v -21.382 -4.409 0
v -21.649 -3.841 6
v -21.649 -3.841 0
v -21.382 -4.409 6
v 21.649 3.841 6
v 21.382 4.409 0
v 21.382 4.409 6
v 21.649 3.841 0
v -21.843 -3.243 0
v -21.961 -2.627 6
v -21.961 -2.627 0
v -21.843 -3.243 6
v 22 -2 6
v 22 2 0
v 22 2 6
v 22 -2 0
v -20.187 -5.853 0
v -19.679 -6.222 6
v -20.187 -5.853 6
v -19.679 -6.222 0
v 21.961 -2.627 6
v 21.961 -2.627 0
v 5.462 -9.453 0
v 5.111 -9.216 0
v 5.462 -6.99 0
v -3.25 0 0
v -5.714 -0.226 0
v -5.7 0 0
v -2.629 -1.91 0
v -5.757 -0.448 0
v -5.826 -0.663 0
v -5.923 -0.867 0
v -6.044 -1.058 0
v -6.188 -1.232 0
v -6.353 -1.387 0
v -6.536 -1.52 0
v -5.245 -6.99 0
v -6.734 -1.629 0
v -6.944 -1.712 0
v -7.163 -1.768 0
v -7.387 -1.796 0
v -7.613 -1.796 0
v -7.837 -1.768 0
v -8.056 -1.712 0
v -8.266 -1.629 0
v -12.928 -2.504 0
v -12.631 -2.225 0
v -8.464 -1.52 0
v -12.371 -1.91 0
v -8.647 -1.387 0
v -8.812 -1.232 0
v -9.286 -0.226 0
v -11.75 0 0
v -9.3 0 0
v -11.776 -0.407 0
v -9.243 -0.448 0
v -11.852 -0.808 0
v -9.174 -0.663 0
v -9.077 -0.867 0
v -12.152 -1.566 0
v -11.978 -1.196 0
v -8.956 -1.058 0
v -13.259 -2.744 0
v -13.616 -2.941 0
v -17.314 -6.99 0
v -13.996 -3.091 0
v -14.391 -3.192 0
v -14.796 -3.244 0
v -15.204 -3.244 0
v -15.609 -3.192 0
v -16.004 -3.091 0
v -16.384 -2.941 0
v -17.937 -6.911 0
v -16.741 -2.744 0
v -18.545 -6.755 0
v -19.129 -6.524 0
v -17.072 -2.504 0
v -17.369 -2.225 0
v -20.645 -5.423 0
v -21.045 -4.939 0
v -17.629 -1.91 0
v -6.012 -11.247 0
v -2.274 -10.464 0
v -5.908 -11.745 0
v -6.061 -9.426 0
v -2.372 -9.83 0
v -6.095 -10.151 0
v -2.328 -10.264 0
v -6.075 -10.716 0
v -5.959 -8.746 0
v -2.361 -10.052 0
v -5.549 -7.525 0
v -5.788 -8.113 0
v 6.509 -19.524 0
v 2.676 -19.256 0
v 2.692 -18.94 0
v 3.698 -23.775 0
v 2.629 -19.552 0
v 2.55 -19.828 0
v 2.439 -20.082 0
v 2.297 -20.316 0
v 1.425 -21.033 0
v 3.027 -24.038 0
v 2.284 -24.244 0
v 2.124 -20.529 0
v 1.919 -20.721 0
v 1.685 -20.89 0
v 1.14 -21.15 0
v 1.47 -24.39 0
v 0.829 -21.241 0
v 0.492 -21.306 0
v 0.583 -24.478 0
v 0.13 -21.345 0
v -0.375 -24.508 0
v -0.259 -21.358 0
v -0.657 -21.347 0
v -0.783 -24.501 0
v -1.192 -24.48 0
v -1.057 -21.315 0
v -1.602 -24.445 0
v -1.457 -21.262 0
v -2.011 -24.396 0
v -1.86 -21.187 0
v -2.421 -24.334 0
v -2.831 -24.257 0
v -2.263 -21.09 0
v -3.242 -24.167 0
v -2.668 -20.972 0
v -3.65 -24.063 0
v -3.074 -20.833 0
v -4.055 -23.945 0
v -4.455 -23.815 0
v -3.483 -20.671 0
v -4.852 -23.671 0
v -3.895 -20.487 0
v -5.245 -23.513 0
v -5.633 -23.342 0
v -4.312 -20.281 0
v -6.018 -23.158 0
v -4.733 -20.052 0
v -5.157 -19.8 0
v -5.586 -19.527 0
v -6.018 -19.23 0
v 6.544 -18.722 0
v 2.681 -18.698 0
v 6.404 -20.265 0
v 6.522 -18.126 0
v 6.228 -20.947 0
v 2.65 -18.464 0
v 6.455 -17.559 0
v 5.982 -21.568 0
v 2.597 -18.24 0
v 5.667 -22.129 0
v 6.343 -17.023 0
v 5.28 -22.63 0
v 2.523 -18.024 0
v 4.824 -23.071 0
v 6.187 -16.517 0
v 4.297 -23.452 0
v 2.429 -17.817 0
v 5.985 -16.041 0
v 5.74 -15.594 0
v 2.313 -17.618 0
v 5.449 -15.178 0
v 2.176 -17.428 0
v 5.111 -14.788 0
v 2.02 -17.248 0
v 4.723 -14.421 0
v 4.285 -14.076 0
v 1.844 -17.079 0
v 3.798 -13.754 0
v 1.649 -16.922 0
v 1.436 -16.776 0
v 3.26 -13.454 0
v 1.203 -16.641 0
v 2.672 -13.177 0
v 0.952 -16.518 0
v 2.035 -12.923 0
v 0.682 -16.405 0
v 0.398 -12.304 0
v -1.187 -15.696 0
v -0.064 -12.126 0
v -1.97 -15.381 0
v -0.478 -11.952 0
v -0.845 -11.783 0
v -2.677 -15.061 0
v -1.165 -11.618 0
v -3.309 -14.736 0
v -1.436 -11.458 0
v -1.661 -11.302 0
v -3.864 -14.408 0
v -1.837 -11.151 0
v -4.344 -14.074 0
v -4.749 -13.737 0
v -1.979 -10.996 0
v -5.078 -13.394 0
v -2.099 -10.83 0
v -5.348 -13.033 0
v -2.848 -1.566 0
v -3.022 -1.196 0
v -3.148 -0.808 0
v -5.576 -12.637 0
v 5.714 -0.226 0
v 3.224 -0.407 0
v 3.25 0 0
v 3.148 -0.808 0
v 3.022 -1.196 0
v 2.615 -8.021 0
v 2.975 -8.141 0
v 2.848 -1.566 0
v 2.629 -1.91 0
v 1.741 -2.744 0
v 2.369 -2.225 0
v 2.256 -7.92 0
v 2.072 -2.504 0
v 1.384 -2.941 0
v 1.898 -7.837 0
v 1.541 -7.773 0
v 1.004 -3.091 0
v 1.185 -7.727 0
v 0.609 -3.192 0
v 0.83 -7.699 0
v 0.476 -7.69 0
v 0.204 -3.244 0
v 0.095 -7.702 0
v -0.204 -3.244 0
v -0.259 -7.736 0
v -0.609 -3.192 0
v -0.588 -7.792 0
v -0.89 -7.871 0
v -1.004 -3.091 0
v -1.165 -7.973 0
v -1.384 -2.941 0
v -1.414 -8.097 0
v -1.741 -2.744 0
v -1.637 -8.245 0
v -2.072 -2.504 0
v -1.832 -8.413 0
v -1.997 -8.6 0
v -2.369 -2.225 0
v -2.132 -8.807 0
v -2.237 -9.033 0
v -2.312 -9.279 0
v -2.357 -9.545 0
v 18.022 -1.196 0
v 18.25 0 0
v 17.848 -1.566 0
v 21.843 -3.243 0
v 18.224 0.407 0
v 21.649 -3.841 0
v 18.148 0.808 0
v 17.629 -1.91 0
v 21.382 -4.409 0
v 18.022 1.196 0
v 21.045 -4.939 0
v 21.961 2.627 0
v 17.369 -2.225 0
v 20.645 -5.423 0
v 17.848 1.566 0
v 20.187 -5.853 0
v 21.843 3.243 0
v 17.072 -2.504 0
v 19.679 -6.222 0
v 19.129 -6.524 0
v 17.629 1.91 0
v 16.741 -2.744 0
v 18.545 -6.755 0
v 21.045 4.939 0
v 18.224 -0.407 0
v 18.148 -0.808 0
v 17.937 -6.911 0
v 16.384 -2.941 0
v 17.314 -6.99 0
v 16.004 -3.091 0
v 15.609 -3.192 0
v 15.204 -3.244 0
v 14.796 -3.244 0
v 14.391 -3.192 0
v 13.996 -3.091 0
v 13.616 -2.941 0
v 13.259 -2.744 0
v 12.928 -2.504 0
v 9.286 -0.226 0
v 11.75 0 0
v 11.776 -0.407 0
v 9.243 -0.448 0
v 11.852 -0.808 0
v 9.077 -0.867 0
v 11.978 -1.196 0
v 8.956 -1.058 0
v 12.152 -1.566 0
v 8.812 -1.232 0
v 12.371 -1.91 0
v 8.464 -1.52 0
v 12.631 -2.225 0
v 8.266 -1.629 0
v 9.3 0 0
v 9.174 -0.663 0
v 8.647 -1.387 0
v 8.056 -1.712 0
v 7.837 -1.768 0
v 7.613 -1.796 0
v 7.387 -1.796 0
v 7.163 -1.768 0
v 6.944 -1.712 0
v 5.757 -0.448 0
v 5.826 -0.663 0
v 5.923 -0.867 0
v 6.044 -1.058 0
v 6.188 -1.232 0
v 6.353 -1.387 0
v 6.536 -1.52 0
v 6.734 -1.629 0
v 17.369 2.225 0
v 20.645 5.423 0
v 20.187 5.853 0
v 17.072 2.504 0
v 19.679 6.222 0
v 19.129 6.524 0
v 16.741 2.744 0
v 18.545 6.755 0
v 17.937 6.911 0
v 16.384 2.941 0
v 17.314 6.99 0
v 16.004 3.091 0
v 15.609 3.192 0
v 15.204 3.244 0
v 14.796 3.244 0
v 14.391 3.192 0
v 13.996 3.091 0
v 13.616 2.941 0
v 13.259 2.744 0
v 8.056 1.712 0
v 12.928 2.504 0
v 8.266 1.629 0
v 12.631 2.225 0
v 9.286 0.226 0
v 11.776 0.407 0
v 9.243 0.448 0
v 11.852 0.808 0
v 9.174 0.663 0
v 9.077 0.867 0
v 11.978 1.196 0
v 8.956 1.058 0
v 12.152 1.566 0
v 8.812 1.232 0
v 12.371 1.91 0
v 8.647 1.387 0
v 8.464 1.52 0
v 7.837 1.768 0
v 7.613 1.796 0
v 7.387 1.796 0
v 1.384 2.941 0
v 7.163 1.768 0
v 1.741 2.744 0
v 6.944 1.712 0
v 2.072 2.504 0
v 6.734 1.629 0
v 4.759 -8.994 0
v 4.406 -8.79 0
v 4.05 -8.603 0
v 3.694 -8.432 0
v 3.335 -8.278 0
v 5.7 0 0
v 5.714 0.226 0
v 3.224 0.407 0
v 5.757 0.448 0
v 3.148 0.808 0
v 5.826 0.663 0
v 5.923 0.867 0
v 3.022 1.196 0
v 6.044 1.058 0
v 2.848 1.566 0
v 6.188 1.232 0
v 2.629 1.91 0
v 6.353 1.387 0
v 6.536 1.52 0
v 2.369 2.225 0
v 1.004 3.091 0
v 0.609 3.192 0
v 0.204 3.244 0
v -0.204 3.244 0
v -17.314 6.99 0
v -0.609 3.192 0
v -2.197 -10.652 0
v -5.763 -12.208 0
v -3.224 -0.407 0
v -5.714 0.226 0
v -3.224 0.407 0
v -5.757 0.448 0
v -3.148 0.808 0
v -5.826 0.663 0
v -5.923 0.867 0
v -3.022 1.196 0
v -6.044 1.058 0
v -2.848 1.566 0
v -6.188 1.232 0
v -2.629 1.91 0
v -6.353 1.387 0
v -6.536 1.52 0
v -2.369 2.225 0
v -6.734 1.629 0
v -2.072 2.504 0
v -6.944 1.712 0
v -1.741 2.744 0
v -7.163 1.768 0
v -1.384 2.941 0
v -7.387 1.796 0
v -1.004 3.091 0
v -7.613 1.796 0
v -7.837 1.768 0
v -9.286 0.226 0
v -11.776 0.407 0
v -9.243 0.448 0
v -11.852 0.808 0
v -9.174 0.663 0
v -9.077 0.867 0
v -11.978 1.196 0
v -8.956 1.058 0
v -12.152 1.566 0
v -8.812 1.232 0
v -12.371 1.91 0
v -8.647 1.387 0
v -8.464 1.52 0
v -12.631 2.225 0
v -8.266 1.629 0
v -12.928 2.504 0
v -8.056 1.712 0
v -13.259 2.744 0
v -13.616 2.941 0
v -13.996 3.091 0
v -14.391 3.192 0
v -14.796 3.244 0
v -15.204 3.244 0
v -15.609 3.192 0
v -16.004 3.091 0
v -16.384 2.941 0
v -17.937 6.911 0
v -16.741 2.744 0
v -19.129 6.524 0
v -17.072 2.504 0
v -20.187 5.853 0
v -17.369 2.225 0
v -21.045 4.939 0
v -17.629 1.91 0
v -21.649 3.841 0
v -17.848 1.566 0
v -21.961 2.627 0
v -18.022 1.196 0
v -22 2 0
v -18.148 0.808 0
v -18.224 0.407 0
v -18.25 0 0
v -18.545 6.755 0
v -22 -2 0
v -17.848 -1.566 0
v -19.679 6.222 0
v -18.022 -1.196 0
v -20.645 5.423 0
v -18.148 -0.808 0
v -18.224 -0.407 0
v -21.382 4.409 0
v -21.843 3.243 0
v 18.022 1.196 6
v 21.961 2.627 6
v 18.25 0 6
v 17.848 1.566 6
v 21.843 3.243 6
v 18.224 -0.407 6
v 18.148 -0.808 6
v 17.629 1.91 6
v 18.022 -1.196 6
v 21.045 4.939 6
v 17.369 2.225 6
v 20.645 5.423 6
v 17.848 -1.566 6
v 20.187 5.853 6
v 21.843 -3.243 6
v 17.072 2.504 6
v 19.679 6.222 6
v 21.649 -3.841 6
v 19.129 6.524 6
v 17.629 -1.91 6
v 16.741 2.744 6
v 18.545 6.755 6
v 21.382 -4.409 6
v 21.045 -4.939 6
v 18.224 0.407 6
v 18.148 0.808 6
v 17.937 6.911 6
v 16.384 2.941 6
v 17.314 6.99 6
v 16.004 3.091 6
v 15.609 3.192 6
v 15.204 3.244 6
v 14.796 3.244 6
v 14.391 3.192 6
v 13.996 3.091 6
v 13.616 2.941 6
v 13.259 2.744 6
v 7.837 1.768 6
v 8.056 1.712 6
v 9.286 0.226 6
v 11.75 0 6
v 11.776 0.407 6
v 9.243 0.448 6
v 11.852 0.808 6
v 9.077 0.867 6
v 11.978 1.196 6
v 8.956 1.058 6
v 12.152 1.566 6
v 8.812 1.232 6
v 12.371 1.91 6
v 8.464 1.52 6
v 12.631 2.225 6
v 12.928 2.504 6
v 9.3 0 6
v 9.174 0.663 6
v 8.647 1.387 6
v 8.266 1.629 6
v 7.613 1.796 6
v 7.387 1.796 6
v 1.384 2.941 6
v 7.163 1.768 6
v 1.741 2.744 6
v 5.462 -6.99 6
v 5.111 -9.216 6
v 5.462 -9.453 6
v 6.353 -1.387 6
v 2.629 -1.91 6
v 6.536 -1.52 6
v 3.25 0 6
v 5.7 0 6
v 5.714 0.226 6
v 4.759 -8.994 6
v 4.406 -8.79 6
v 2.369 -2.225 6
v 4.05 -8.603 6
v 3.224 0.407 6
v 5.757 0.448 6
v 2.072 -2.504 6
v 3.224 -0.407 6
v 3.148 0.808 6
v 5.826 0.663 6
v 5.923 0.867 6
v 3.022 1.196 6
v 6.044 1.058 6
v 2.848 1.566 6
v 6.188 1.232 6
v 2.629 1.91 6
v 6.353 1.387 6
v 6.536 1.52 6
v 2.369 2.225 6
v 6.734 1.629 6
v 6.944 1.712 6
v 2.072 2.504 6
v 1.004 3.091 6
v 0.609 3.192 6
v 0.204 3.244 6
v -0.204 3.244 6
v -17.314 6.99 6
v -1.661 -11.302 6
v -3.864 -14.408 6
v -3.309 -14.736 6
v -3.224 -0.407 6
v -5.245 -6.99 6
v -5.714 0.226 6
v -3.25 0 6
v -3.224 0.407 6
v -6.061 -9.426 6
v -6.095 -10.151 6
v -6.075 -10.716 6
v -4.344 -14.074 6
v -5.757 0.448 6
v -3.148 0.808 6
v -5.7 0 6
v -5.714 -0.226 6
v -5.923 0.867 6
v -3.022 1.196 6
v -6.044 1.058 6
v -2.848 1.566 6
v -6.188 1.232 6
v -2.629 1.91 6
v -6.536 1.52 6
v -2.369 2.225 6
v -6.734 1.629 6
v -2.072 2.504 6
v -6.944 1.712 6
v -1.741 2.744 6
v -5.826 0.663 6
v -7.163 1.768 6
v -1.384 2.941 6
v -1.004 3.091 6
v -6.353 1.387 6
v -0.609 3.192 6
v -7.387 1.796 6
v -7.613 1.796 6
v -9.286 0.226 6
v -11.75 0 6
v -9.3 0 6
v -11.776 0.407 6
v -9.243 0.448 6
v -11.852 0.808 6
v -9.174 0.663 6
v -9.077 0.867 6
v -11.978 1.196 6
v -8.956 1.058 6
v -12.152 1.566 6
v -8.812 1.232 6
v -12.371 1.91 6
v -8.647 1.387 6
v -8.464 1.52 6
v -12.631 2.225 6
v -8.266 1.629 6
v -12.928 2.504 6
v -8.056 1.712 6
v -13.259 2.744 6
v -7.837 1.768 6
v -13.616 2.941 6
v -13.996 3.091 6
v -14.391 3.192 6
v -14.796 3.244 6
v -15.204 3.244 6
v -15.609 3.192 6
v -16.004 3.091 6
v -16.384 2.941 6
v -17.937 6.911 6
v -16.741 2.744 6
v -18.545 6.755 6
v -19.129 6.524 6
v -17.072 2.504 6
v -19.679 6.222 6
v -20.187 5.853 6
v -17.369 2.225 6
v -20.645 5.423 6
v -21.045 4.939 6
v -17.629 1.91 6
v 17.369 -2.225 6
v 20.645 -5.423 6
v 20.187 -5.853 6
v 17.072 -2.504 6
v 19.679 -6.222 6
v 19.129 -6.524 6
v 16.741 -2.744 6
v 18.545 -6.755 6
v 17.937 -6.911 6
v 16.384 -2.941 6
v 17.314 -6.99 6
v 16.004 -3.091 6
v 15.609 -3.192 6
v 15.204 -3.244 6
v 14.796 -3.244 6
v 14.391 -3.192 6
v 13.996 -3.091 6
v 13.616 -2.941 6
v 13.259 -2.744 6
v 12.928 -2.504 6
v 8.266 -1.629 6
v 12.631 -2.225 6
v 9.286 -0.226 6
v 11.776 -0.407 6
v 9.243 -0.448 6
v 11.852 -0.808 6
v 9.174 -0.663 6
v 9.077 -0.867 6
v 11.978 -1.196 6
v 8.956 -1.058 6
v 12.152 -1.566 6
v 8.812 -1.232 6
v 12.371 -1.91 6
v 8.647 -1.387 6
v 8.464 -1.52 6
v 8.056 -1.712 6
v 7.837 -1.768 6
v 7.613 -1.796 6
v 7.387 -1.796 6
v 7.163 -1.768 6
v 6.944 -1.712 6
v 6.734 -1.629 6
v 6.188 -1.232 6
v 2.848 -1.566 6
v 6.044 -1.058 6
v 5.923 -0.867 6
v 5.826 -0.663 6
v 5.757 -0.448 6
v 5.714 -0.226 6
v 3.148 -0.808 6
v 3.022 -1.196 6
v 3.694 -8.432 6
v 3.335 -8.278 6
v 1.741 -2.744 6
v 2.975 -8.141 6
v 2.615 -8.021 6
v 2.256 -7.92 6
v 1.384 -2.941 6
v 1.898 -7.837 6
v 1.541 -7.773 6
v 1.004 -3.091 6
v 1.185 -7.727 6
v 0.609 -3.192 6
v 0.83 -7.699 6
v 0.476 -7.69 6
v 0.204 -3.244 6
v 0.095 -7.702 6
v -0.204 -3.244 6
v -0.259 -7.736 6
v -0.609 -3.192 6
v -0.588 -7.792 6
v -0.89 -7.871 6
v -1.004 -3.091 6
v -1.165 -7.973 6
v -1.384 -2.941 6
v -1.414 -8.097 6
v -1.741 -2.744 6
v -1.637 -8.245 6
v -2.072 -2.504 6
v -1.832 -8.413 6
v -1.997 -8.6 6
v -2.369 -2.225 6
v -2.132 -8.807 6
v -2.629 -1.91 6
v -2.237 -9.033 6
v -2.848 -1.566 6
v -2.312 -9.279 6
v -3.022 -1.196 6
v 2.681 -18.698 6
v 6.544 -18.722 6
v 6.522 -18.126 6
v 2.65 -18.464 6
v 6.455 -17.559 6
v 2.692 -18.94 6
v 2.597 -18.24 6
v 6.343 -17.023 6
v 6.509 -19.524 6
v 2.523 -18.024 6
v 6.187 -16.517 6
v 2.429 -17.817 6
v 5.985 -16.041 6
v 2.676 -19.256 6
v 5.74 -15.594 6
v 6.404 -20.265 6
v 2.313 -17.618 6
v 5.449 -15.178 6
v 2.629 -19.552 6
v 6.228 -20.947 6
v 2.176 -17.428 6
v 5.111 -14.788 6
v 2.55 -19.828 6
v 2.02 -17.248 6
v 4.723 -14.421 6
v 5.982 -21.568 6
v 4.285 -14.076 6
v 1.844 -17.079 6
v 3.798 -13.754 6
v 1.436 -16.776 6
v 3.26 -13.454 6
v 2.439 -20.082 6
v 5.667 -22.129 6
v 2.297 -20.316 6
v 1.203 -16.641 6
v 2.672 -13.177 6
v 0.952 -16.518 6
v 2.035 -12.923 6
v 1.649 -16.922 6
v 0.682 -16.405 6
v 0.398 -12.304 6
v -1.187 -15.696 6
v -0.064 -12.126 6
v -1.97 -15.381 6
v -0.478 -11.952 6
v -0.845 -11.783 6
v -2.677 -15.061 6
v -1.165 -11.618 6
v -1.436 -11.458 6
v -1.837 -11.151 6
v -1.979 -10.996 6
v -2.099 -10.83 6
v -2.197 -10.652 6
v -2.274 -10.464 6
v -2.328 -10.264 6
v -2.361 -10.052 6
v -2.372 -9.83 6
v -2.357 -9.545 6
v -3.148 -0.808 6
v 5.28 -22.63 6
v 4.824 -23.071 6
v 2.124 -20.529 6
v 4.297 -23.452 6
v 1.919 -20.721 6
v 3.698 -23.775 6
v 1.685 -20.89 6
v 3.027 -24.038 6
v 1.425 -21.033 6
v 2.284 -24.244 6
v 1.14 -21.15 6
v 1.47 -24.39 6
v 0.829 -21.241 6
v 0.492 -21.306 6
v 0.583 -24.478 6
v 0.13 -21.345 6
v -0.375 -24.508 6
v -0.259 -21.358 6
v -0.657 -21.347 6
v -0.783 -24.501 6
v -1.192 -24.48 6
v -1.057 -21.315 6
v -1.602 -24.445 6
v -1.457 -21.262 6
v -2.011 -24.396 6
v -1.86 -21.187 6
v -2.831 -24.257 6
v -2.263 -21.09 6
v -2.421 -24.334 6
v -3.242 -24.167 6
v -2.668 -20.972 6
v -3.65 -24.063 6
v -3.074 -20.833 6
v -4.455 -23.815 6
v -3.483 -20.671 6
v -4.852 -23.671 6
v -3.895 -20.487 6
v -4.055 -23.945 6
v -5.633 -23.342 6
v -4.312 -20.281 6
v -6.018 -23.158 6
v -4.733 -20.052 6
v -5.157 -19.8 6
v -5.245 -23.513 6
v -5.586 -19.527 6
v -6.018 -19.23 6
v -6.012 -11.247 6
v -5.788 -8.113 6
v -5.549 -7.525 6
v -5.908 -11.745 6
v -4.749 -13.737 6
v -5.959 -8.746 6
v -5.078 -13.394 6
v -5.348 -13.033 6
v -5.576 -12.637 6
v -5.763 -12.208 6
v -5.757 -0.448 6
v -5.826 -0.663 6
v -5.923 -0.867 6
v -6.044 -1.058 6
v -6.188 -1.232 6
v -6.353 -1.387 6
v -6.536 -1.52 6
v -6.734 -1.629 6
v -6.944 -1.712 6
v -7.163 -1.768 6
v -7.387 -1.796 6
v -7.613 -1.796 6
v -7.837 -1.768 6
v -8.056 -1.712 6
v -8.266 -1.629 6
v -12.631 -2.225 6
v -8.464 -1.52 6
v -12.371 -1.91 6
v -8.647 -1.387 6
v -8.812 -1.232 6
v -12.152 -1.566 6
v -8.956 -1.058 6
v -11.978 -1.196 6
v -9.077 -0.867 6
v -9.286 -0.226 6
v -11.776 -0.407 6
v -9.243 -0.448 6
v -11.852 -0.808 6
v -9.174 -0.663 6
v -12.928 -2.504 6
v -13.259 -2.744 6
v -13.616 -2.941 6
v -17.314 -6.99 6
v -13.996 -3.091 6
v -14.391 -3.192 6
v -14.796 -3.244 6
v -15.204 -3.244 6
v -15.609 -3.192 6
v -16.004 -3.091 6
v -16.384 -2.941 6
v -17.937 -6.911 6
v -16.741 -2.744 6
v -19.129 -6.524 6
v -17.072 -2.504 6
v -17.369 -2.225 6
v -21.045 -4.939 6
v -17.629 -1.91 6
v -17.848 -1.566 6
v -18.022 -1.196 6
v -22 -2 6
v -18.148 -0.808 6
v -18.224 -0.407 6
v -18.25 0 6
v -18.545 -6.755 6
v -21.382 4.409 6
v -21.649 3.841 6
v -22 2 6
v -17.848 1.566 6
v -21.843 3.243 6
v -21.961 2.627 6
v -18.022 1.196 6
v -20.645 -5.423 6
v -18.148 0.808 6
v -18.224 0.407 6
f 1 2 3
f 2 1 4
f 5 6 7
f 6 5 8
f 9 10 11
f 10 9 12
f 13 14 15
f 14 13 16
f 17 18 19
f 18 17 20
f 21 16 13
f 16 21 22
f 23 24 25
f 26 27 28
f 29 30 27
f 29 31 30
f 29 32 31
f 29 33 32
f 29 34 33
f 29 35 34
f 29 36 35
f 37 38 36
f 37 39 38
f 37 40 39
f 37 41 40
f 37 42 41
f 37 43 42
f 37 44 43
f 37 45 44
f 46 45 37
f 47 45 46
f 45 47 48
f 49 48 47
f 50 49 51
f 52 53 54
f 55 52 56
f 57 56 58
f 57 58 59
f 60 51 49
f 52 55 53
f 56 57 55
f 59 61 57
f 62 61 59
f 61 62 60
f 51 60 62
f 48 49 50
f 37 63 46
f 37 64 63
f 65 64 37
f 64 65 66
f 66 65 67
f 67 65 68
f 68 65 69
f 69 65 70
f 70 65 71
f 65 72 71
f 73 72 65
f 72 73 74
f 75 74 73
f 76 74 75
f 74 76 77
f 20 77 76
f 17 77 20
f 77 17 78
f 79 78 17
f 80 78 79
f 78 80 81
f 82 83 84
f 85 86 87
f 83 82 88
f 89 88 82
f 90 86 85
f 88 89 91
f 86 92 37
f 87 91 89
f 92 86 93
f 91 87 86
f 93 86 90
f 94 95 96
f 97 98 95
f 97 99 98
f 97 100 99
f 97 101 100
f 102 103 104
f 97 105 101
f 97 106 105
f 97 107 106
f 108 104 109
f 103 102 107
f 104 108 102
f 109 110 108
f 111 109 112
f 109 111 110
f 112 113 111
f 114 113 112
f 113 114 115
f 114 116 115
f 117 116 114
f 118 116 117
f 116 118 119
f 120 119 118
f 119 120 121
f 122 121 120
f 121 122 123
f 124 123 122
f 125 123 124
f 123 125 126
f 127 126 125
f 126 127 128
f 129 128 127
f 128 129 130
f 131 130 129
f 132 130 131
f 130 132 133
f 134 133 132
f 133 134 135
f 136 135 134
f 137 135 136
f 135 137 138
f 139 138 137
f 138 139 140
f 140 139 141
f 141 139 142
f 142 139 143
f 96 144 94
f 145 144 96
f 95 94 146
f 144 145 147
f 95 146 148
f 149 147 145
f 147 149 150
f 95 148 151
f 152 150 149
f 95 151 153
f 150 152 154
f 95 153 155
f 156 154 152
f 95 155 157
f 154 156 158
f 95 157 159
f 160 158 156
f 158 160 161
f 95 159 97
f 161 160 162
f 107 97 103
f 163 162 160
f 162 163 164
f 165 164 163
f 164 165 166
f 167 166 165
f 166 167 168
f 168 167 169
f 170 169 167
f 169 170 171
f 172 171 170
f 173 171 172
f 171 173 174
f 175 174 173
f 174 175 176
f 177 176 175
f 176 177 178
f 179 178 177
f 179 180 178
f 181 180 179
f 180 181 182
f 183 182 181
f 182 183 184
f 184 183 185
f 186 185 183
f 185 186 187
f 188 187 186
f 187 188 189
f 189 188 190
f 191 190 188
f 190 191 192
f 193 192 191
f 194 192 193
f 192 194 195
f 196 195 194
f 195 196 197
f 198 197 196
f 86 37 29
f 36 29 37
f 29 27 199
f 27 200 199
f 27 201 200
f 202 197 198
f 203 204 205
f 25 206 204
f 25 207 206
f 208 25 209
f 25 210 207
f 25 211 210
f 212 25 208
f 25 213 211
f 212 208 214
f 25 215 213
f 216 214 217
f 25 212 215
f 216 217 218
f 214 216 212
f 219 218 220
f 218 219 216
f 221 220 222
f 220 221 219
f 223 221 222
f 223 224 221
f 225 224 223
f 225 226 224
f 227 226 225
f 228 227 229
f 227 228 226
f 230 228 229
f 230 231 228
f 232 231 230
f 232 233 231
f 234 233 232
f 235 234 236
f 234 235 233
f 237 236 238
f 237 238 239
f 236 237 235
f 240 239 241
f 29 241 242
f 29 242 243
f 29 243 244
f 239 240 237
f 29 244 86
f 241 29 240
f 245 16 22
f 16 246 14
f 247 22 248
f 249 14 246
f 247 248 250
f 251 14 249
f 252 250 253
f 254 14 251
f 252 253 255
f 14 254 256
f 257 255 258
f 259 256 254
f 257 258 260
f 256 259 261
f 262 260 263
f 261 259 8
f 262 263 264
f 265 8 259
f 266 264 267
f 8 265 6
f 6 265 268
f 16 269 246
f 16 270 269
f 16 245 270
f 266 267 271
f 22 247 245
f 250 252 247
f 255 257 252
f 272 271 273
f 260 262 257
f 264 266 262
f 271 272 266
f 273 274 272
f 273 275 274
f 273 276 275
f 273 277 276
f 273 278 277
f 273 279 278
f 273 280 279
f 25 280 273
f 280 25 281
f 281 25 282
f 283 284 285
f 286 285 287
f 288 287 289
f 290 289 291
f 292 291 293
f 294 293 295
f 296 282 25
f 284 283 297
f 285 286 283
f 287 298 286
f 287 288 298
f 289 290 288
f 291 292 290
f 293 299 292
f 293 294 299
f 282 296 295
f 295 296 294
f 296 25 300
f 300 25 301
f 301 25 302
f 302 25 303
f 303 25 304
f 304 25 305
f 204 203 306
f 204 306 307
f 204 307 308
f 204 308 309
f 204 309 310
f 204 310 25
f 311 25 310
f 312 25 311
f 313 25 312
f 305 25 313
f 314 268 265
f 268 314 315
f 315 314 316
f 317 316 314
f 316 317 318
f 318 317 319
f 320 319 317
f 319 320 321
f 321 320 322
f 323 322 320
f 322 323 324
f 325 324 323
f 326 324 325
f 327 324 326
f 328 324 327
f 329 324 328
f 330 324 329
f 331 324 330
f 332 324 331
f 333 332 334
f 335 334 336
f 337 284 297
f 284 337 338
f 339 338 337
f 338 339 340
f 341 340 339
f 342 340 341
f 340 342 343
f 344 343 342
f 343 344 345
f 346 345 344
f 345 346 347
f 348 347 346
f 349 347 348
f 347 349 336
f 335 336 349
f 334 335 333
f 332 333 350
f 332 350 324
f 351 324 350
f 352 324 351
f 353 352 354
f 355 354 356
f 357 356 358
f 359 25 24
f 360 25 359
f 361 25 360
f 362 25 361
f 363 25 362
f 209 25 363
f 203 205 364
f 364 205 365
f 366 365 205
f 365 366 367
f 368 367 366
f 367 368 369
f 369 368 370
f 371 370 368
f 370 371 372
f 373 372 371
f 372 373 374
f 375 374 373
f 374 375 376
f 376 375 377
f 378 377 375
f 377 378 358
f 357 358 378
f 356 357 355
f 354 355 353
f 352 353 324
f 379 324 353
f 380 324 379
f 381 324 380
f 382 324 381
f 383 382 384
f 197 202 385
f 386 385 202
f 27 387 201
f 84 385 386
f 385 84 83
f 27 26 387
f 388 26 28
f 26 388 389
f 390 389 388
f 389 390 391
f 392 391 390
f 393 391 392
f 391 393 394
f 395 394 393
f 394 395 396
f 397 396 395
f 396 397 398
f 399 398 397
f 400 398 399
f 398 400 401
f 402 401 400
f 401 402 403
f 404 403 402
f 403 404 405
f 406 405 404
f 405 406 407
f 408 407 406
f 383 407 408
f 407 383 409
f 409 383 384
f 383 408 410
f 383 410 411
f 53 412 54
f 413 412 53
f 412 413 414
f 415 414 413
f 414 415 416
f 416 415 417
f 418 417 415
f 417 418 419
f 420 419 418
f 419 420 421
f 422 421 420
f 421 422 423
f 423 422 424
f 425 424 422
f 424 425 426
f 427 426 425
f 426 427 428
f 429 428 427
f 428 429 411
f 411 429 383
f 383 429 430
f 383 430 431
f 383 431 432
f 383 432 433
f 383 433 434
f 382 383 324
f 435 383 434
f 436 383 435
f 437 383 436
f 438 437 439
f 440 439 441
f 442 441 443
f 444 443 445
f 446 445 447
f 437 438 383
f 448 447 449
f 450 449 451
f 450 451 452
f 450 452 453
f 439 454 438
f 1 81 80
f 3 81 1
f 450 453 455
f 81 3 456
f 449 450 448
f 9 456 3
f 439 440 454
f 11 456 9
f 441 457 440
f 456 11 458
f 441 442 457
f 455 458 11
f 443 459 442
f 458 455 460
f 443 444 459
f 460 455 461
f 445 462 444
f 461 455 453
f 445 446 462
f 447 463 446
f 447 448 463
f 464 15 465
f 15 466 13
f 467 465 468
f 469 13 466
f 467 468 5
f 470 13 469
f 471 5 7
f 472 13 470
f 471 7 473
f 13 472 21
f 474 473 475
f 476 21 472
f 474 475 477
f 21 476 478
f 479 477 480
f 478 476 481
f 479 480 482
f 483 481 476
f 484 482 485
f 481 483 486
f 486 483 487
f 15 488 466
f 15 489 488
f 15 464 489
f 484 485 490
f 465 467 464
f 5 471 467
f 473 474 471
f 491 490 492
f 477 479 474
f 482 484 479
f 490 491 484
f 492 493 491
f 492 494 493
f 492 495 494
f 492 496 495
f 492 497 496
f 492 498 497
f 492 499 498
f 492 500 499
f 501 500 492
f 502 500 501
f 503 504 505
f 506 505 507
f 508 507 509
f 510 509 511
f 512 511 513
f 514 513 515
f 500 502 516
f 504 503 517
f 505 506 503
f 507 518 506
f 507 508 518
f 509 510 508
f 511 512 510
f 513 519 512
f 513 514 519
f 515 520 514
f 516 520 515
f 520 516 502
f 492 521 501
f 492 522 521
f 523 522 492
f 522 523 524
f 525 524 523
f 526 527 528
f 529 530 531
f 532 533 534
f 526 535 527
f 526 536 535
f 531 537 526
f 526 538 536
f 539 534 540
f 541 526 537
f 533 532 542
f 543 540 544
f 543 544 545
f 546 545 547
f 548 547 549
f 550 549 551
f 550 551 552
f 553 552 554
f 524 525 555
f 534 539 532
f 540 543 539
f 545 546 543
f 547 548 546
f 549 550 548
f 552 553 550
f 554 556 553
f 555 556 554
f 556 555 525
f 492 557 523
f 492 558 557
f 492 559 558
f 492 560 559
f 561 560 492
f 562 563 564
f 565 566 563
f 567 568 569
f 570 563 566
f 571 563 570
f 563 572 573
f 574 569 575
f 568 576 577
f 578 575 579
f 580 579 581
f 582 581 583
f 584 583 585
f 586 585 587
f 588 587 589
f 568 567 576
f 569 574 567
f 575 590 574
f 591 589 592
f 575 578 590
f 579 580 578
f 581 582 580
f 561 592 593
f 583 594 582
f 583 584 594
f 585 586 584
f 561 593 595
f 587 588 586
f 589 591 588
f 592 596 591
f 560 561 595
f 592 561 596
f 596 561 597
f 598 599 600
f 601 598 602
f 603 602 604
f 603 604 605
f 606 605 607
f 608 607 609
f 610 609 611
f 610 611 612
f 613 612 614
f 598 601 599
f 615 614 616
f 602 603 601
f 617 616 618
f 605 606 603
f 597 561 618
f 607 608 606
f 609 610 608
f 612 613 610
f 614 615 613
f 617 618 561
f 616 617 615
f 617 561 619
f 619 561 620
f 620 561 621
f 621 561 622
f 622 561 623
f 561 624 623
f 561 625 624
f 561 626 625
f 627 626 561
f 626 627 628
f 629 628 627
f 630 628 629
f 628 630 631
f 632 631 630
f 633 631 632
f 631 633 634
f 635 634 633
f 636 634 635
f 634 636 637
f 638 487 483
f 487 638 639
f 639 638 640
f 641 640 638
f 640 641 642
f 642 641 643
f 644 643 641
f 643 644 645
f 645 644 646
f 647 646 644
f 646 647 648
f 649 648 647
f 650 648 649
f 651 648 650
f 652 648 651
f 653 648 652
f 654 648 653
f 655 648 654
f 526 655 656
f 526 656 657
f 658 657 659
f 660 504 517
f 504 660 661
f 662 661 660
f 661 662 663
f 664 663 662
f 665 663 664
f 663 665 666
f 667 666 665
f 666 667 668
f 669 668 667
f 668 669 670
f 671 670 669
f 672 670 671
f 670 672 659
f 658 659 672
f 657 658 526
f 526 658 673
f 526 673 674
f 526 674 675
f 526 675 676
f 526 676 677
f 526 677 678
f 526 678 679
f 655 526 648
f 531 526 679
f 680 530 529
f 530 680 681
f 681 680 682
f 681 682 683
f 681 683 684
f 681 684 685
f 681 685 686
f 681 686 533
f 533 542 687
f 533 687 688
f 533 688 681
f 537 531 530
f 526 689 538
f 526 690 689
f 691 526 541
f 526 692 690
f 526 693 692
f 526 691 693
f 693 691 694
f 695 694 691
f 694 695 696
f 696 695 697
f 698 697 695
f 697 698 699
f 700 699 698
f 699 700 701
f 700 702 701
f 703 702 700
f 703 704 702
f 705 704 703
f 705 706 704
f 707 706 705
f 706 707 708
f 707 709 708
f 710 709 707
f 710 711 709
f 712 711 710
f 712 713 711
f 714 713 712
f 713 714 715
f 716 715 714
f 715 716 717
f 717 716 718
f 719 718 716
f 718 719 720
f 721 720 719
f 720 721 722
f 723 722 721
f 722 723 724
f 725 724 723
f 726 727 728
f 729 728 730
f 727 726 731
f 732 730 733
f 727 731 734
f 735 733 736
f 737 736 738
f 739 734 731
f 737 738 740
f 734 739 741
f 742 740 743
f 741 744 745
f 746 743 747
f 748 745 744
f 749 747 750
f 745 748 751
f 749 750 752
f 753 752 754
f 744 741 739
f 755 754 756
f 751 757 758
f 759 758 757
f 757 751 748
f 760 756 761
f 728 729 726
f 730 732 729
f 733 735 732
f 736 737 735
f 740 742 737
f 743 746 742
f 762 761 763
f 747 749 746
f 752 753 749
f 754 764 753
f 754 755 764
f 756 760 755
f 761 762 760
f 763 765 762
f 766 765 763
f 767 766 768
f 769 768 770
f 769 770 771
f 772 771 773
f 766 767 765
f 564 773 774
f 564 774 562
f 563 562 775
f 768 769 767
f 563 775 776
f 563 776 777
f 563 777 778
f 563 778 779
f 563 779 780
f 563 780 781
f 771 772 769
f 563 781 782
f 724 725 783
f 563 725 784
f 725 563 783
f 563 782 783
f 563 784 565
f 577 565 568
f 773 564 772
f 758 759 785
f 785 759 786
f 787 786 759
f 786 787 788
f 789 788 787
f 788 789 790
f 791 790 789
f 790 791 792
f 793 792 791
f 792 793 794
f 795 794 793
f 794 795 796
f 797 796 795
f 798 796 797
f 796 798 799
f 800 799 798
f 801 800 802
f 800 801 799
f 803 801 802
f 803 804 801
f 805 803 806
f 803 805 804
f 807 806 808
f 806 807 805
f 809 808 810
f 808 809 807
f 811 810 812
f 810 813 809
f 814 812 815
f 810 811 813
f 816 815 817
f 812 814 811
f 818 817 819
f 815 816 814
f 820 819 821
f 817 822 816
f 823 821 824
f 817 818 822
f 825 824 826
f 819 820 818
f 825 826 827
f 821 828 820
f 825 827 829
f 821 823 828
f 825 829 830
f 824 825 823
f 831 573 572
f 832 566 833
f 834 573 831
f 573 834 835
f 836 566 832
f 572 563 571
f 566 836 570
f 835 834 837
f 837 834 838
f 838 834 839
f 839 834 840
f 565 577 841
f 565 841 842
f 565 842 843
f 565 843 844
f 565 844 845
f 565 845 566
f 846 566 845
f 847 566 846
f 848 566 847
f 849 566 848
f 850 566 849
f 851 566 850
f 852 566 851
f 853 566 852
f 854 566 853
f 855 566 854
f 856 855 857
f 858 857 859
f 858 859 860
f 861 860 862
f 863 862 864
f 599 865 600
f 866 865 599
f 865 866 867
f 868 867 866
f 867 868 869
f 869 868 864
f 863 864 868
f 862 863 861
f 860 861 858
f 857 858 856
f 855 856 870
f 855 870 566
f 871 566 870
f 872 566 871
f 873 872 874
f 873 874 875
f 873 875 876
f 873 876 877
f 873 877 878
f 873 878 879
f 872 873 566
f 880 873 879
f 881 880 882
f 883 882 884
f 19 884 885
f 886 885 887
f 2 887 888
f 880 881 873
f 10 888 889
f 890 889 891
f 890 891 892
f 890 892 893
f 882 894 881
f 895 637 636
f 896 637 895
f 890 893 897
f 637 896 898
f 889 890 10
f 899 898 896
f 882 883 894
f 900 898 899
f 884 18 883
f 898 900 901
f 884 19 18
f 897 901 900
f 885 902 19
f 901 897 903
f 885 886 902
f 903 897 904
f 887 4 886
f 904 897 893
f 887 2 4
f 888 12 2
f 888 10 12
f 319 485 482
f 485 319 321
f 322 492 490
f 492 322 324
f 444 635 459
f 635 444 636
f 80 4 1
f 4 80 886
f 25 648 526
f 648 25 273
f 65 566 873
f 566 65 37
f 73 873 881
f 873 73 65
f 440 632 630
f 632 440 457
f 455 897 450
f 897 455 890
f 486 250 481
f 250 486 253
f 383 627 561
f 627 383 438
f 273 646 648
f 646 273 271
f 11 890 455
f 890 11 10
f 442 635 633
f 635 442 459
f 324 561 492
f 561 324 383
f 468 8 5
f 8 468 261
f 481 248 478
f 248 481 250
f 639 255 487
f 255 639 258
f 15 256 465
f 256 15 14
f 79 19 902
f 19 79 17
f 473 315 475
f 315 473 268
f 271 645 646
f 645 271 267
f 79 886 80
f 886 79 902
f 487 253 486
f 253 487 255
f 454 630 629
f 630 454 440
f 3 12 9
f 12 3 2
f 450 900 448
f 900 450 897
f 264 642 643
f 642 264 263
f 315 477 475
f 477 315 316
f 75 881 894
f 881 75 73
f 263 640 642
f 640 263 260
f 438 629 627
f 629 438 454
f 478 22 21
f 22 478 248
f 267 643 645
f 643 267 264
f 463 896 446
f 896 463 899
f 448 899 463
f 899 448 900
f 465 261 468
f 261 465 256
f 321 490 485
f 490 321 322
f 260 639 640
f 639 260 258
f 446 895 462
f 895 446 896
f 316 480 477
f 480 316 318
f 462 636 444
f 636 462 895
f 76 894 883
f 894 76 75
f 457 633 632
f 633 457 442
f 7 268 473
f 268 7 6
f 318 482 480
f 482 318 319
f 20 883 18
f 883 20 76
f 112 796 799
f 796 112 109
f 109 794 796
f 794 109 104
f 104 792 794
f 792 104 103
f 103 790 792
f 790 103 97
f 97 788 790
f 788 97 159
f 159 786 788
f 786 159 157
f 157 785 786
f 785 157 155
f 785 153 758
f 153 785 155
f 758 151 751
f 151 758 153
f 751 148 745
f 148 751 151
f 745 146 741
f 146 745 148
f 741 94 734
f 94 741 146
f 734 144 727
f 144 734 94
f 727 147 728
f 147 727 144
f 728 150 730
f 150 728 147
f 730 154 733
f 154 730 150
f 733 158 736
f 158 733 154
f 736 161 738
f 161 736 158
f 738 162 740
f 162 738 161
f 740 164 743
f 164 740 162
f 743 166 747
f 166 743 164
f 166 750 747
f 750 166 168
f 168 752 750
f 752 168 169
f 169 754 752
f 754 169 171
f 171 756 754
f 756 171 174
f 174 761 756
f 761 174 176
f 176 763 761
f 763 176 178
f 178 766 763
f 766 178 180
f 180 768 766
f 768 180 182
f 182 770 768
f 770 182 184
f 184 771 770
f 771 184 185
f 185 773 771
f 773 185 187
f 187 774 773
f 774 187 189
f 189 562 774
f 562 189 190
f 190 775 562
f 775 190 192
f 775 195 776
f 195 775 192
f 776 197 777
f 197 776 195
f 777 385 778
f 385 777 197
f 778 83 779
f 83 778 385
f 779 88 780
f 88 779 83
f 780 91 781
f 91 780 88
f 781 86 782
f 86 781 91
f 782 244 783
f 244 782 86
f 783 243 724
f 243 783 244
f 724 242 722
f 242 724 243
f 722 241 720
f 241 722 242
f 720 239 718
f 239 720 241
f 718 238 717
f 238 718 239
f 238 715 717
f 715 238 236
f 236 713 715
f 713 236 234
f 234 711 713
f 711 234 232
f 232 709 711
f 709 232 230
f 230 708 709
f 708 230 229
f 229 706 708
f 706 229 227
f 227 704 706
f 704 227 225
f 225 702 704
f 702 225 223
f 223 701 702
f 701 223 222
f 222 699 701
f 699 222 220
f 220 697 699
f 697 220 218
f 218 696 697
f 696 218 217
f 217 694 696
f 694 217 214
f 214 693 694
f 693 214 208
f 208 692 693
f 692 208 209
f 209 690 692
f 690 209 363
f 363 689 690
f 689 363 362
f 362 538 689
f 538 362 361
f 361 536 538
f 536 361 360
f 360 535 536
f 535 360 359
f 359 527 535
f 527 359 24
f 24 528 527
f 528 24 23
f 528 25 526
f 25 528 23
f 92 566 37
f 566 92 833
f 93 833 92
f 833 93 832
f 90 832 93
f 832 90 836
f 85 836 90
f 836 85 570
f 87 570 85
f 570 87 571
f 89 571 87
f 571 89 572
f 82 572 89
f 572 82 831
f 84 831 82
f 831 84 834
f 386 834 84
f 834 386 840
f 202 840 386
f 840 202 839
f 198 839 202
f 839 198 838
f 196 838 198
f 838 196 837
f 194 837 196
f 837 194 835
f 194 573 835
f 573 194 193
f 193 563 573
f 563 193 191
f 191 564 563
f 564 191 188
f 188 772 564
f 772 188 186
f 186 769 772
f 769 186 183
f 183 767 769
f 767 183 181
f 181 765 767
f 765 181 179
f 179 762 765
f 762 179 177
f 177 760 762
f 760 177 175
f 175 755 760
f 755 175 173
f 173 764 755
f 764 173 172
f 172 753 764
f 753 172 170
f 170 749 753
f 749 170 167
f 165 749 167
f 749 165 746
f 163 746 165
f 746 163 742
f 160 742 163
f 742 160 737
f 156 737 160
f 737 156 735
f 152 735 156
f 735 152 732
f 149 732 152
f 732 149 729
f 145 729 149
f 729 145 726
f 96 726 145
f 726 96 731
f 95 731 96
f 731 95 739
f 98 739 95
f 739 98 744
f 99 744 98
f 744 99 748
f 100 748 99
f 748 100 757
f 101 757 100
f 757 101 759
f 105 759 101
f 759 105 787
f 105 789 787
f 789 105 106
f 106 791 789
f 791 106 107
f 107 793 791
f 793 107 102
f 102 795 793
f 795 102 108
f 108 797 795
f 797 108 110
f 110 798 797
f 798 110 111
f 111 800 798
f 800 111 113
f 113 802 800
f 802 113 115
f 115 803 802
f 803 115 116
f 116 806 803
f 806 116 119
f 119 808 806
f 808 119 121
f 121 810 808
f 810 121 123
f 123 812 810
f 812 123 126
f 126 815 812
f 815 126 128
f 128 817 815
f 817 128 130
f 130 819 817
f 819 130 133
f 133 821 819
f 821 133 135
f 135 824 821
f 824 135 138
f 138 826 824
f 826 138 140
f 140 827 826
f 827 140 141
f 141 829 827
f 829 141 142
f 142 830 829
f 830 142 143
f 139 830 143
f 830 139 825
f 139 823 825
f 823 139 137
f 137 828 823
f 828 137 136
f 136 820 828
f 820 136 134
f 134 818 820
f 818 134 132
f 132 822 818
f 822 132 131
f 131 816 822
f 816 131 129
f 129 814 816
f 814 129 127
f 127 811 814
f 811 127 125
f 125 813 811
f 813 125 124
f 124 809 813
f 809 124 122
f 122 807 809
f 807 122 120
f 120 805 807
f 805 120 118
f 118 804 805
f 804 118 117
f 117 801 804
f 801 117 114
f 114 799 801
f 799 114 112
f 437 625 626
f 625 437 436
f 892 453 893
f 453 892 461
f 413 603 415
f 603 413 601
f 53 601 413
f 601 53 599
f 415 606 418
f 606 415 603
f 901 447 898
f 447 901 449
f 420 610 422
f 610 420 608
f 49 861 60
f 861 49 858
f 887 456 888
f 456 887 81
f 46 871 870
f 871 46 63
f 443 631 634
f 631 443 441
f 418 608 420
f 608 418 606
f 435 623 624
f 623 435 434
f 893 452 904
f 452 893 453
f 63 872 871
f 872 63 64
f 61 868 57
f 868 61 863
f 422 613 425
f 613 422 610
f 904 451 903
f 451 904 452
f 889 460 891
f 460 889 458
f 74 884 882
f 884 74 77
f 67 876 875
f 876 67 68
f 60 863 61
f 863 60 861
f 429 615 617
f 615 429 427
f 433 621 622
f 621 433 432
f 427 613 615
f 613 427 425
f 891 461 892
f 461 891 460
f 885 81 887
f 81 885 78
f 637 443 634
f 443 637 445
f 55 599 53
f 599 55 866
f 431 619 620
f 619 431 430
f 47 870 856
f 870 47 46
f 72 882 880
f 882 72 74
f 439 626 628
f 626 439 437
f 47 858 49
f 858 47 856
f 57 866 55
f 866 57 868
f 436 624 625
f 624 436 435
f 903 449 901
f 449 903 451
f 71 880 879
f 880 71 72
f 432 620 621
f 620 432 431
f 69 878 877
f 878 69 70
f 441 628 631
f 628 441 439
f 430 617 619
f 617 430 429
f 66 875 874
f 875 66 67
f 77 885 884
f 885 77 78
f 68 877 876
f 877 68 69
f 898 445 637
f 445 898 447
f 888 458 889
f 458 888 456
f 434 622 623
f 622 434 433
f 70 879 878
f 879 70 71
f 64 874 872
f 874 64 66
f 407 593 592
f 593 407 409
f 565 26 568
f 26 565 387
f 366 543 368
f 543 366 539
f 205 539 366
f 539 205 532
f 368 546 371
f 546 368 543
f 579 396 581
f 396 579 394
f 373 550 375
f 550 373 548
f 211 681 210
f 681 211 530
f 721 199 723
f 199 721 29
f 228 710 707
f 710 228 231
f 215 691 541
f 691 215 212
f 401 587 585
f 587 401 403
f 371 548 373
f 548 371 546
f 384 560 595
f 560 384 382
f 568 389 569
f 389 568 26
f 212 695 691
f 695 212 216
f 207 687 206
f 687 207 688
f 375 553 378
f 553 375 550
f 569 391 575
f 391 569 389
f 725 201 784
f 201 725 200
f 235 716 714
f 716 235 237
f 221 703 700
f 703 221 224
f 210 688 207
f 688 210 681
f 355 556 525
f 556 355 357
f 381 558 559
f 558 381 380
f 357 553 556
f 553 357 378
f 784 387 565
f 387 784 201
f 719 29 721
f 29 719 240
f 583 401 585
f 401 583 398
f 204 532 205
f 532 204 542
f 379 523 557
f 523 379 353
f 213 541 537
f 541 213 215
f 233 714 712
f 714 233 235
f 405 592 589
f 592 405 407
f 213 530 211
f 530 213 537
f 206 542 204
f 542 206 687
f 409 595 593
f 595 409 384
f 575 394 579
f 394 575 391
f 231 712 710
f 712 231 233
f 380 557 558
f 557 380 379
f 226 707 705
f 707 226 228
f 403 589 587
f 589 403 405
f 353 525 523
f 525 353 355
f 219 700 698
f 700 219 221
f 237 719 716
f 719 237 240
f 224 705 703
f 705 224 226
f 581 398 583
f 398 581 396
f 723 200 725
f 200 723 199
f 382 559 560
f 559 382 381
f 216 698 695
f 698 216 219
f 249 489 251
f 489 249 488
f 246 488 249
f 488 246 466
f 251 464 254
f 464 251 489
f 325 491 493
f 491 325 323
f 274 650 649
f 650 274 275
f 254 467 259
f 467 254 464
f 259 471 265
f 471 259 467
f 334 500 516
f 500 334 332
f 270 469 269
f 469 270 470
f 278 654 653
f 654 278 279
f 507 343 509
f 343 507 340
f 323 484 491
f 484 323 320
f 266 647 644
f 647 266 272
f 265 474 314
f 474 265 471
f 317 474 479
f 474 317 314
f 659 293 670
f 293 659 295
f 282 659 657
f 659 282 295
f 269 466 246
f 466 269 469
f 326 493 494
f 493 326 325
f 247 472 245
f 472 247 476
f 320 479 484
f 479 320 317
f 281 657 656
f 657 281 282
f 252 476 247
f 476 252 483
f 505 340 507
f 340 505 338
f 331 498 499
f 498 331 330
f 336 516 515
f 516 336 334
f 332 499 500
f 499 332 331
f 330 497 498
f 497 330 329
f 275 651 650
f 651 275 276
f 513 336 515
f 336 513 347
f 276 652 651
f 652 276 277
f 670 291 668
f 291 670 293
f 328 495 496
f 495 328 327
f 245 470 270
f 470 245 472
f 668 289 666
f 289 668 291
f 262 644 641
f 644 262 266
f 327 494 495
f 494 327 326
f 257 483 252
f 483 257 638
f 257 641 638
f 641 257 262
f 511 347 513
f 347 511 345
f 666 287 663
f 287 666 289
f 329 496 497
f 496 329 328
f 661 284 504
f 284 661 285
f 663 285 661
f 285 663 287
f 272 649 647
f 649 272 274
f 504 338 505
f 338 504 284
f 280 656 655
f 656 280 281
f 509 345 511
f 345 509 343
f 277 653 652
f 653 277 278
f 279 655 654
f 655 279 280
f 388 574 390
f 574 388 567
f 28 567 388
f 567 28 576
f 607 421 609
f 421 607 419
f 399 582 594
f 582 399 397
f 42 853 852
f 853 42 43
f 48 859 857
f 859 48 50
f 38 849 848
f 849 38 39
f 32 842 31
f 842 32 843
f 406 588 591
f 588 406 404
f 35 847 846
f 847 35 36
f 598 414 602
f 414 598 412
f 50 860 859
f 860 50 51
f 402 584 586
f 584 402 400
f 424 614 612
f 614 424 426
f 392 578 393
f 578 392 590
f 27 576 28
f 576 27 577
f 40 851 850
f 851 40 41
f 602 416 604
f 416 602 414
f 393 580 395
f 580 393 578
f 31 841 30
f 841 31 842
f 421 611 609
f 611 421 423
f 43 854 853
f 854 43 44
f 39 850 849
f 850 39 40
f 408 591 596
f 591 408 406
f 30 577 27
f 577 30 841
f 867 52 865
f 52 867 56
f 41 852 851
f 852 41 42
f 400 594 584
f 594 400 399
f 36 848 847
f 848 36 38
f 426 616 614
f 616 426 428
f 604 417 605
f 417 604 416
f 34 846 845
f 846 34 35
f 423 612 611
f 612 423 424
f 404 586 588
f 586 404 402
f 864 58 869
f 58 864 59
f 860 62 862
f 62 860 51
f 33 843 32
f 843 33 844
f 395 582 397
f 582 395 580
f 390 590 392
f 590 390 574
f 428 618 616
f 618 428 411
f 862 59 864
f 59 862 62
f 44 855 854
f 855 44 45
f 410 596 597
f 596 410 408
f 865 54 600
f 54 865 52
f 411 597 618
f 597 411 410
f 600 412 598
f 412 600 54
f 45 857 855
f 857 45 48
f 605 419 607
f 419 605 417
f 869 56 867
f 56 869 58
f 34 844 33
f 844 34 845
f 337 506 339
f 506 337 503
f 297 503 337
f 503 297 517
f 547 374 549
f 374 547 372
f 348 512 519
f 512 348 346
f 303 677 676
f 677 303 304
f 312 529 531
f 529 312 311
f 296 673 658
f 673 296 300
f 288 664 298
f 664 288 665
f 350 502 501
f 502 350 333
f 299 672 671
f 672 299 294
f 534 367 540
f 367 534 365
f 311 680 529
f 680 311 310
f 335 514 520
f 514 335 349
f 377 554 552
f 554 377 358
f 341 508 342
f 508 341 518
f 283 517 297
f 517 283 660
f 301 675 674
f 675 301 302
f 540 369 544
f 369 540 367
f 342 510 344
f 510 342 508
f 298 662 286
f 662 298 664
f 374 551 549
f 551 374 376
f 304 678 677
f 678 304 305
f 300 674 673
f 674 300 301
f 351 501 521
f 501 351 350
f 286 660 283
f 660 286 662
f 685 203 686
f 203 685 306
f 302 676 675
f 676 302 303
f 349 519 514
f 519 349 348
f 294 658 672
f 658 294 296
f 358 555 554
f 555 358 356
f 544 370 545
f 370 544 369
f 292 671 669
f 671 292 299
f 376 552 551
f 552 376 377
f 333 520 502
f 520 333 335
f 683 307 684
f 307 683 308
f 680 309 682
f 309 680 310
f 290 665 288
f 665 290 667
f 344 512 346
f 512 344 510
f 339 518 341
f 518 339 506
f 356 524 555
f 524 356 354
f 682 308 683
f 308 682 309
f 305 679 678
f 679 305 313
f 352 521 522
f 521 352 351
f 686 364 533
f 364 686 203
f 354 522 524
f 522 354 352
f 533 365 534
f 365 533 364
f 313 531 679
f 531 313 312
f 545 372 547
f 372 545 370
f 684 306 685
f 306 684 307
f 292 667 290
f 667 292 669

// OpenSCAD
$fn = 50;


difference() {
	union() {
		hull() {
			translate(v = [-17.0000000000, 2.0000000000, 0]) {
				cylinder(h = 6, r = 5);
			}
			translate(v = [17.0000000000, 2.0000000000, 0]) {
				cylinder(h = 6, r = 5);
			}
			translate(v = [-17.0000000000, -2.0000000000, 0]) {
				cylinder(h = 6, r = 5);
			}
			translate(v = [17.0000000000, -2.0000000000, 0]) {
				cylinder(h = 6, r = 5);
			}
		}
		translate(v = [0, -5, 0]) {
			linear_extrude(height = 6) {
				text(font = "DejaVu Sans Mono:style=Bold", halign = "center", size = 19.0000000000, text = "S", valign = "top");
			}
		}
	}
	union() {
		translate(v = [-15.0000000000, 0.0000000000, 0]) {
			translate(v = [0, 0, -100]) {
				cylinder(h = 200, r = 3.2500000000);
			}
		}
		translate(v = [0, 0, -100]) {
			cylinder(h = 200, r = 3.2500000000);
		}
		translate(v = [15.0000000000, 0.0000000000, 0]) {
			translate(v = [0, 0, -100]) {
				cylinder(h = 200, r = 3.2500000000);
			}
		}
		translate(v = [-15.0000000000, 0.0000000000, 0]) {
			translate(v = [0, 0, -100]) {
				cylinder(h = 200, r = 1.8000000000);
			}
		}
		translate(v = [-7.5000000000, 0.0000000000, 0]) {
			translate(v = [0, 0, -100]) {
				cylinder(h = 200, r = 1.8000000000);
			}
		}
		translate(v = [0, 0, -100]) {
			cylinder(h = 200, r = 1.8000000000);
		}
		translate(v = [7.5000000000, 0.0000000000, 0]) {
			translate(v = [0, 0, -100]) {
				cylinder(h = 200, r = 1.8000000000);
			}
		}
		translate(v = [15.0000000000, 0.0000000000, 0]) {
			translate(v = [0, 0, -100]) {
				cylinder(h = 200, r = 1.8000000000);
			}
		}
	}
}
